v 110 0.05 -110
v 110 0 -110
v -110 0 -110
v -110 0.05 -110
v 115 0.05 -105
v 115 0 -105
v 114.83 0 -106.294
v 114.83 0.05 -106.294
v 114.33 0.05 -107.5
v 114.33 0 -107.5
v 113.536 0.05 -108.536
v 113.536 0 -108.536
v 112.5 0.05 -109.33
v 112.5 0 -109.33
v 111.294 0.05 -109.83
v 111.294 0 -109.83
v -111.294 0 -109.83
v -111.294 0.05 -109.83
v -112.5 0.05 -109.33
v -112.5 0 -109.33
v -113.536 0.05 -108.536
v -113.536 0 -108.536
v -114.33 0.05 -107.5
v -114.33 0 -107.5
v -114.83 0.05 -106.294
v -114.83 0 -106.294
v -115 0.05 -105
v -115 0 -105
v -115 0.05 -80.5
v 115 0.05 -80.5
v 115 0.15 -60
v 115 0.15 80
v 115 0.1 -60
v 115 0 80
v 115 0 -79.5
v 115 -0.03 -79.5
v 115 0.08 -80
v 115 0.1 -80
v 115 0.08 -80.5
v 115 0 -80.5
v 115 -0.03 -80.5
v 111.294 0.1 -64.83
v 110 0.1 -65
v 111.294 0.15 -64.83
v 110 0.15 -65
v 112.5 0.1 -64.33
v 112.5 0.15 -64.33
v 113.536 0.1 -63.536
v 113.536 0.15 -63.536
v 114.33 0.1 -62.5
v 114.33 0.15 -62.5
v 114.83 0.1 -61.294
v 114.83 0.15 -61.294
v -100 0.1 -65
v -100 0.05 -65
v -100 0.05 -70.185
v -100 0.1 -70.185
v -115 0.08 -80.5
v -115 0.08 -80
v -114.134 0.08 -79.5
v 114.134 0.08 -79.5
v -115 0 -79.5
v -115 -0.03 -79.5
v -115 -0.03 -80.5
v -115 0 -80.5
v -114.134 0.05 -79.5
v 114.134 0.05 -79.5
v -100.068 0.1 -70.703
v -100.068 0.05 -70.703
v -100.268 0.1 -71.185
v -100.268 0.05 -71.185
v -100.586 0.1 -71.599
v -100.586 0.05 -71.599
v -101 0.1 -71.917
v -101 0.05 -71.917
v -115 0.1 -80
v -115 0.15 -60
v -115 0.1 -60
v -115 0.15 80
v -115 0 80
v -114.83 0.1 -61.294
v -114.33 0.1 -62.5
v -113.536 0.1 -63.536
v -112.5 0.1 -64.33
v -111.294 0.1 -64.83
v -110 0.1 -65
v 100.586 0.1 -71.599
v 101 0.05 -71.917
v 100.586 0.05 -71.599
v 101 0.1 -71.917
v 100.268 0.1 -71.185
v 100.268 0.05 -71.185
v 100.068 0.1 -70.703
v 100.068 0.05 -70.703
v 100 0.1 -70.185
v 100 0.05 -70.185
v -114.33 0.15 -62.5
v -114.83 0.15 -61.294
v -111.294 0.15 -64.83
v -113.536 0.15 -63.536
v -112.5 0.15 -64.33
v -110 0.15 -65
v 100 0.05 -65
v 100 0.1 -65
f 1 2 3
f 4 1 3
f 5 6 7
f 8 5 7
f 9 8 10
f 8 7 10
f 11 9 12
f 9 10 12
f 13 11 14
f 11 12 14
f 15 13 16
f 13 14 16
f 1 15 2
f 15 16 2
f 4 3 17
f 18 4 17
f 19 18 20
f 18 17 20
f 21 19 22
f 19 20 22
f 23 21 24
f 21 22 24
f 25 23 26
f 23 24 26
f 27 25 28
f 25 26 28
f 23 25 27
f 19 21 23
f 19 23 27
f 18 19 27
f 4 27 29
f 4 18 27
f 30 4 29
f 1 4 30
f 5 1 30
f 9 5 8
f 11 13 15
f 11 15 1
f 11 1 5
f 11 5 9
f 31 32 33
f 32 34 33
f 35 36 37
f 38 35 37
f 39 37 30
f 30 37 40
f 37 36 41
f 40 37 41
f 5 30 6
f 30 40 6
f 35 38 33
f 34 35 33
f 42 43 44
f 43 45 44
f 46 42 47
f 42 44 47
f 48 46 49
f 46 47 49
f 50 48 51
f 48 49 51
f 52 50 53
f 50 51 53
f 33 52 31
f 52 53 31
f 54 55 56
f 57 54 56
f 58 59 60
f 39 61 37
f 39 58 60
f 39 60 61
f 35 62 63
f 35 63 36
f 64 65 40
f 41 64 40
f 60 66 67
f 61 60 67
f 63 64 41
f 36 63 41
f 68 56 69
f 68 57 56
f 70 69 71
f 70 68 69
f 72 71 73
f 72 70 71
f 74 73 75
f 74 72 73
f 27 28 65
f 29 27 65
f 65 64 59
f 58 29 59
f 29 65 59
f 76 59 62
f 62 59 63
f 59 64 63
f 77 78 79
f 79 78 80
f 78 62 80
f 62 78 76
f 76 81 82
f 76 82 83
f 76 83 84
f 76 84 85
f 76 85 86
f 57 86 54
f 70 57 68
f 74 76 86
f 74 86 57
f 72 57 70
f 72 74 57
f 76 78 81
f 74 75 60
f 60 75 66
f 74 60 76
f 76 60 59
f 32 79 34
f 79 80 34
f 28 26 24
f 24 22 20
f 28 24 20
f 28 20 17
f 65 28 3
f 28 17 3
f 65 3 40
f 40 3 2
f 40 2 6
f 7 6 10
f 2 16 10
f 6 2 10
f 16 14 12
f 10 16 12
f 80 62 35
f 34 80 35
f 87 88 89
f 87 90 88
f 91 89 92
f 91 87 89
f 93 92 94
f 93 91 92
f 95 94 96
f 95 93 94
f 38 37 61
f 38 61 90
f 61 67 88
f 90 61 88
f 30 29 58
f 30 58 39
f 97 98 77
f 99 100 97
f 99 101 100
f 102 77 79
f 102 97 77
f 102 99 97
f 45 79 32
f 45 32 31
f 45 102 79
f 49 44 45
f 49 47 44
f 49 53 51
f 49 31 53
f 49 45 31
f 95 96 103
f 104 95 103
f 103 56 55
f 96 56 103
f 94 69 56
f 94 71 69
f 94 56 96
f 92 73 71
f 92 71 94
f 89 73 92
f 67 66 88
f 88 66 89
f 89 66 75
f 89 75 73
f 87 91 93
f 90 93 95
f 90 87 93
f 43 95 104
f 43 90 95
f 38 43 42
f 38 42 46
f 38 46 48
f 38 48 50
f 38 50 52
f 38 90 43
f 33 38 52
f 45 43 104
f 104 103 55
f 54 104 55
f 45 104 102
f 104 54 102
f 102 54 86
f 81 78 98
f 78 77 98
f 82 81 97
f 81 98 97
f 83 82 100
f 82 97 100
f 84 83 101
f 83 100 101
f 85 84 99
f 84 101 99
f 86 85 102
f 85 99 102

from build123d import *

# Parameters (mm, degrees)
BOSS_EXTRUDE1_DEPTH      = 0.05
SKETCH2_W                = 230
SKETCH2_H                = 145
BOSS_EXTRUDE2_DEPTH      = 0.1
BOSS_EXTRUDE3_DEPTH      = 0.05
BOSS_EXTRUDE7_DEPTH      = 0.03
BOSS_EXTRUDE7_DEPTH_BACK = 0.08
SKETCH3_W                = 230
SKETCH3_H                = 1
FILLET1_R                = 5
FILLET2_R                = 2


with BuildPart() as part:
    # Sketch1 → Boss-Extrude1 (new body)
    with BuildSketch(Plane(origin=(0, 0, 0), x_dir=(1, 0, 0), z_dir=(0, 1, 0))):
        with BuildLine():
            Line((-115, 80), (-115, -80))
            Line((-115, -80), (115, -80))
            Line((115, -80), (115, 80))
            Line((115, 80), (115, 105))
            ThreePointArc((115, 105), (113.535533906, 108.535533906), (110, 110))
            Line((110, 110), (-110, 110))
            ThreePointArc((-110, 110), (-113.535533906, 108.535533906), (-115, 105))
            Line((-115, 105), (-115, 80))
        make_face()
    extrude(amount=BOSS_EXTRUDE1_DEPTH)

    # Sketch2 → Boss-Extrude2 (add)
    with BuildSketch(Plane(origin=(0, 0.05, 0), x_dir=(1, 0, 0), z_dir=(0, 1, 0))):
        with Locations((0, -7.5)):
            Rectangle(SKETCH2_W, SKETCH2_H)
    extrude(amount=BOSS_EXTRUDE2_DEPTH)

    # Sketch2<3> → Boss-Extrude3 (add)
    with BuildSketch(Plane(origin=(0, 0.05, 0), x_dir=(1, 0, 0), z_dir=(0, 1, 0))):
        Polygon((-115, 80), (-115, 65), (-100, 65), (-100, 71.339745962), align=None)
        Polygon((100, 71.339745962), (100, 65), (115, 65), (115, 80), align=None)
    extrude(amount=BOSS_EXTRUDE3_DEPTH)

    # Sketch3 → Boss-Extrude7 (add, two sides: drawn at the far end of the back side and taken through both)
    with BuildSketch(Plane(origin=(0, 0.05, 0), x_dir=(1, 0, 0), z_dir=(0, 1, 0)).offset(-BOSS_EXTRUDE7_DEPTH_BACK)):
        with Locations((0, 80)):
            Rectangle(SKETCH3_W, SKETCH3_H)
    extrude(amount=BOSS_EXTRUDE7_DEPTH + BOSS_EXTRUDE7_DEPTH_BACK)

    # Fillet1
    fillet1_edges = [part.edges().sort_by_distance(p)[0] for p in [
        (115, 0.125, -65),
        (-115, 0.125, -65),
    ]]
    fillet(fillet1_edges, radius=FILLET1_R)

    # Fillet2
    fillet2_edges = [part.edges().sort_by_distance(p)[0] for p in [
        (100, 0.075, -71.339745962),
        (-100, 0.075, -71.339745962),
    ]]
    fillet(fillet2_edges, radius=FILLET2_R)


solid = part.part
